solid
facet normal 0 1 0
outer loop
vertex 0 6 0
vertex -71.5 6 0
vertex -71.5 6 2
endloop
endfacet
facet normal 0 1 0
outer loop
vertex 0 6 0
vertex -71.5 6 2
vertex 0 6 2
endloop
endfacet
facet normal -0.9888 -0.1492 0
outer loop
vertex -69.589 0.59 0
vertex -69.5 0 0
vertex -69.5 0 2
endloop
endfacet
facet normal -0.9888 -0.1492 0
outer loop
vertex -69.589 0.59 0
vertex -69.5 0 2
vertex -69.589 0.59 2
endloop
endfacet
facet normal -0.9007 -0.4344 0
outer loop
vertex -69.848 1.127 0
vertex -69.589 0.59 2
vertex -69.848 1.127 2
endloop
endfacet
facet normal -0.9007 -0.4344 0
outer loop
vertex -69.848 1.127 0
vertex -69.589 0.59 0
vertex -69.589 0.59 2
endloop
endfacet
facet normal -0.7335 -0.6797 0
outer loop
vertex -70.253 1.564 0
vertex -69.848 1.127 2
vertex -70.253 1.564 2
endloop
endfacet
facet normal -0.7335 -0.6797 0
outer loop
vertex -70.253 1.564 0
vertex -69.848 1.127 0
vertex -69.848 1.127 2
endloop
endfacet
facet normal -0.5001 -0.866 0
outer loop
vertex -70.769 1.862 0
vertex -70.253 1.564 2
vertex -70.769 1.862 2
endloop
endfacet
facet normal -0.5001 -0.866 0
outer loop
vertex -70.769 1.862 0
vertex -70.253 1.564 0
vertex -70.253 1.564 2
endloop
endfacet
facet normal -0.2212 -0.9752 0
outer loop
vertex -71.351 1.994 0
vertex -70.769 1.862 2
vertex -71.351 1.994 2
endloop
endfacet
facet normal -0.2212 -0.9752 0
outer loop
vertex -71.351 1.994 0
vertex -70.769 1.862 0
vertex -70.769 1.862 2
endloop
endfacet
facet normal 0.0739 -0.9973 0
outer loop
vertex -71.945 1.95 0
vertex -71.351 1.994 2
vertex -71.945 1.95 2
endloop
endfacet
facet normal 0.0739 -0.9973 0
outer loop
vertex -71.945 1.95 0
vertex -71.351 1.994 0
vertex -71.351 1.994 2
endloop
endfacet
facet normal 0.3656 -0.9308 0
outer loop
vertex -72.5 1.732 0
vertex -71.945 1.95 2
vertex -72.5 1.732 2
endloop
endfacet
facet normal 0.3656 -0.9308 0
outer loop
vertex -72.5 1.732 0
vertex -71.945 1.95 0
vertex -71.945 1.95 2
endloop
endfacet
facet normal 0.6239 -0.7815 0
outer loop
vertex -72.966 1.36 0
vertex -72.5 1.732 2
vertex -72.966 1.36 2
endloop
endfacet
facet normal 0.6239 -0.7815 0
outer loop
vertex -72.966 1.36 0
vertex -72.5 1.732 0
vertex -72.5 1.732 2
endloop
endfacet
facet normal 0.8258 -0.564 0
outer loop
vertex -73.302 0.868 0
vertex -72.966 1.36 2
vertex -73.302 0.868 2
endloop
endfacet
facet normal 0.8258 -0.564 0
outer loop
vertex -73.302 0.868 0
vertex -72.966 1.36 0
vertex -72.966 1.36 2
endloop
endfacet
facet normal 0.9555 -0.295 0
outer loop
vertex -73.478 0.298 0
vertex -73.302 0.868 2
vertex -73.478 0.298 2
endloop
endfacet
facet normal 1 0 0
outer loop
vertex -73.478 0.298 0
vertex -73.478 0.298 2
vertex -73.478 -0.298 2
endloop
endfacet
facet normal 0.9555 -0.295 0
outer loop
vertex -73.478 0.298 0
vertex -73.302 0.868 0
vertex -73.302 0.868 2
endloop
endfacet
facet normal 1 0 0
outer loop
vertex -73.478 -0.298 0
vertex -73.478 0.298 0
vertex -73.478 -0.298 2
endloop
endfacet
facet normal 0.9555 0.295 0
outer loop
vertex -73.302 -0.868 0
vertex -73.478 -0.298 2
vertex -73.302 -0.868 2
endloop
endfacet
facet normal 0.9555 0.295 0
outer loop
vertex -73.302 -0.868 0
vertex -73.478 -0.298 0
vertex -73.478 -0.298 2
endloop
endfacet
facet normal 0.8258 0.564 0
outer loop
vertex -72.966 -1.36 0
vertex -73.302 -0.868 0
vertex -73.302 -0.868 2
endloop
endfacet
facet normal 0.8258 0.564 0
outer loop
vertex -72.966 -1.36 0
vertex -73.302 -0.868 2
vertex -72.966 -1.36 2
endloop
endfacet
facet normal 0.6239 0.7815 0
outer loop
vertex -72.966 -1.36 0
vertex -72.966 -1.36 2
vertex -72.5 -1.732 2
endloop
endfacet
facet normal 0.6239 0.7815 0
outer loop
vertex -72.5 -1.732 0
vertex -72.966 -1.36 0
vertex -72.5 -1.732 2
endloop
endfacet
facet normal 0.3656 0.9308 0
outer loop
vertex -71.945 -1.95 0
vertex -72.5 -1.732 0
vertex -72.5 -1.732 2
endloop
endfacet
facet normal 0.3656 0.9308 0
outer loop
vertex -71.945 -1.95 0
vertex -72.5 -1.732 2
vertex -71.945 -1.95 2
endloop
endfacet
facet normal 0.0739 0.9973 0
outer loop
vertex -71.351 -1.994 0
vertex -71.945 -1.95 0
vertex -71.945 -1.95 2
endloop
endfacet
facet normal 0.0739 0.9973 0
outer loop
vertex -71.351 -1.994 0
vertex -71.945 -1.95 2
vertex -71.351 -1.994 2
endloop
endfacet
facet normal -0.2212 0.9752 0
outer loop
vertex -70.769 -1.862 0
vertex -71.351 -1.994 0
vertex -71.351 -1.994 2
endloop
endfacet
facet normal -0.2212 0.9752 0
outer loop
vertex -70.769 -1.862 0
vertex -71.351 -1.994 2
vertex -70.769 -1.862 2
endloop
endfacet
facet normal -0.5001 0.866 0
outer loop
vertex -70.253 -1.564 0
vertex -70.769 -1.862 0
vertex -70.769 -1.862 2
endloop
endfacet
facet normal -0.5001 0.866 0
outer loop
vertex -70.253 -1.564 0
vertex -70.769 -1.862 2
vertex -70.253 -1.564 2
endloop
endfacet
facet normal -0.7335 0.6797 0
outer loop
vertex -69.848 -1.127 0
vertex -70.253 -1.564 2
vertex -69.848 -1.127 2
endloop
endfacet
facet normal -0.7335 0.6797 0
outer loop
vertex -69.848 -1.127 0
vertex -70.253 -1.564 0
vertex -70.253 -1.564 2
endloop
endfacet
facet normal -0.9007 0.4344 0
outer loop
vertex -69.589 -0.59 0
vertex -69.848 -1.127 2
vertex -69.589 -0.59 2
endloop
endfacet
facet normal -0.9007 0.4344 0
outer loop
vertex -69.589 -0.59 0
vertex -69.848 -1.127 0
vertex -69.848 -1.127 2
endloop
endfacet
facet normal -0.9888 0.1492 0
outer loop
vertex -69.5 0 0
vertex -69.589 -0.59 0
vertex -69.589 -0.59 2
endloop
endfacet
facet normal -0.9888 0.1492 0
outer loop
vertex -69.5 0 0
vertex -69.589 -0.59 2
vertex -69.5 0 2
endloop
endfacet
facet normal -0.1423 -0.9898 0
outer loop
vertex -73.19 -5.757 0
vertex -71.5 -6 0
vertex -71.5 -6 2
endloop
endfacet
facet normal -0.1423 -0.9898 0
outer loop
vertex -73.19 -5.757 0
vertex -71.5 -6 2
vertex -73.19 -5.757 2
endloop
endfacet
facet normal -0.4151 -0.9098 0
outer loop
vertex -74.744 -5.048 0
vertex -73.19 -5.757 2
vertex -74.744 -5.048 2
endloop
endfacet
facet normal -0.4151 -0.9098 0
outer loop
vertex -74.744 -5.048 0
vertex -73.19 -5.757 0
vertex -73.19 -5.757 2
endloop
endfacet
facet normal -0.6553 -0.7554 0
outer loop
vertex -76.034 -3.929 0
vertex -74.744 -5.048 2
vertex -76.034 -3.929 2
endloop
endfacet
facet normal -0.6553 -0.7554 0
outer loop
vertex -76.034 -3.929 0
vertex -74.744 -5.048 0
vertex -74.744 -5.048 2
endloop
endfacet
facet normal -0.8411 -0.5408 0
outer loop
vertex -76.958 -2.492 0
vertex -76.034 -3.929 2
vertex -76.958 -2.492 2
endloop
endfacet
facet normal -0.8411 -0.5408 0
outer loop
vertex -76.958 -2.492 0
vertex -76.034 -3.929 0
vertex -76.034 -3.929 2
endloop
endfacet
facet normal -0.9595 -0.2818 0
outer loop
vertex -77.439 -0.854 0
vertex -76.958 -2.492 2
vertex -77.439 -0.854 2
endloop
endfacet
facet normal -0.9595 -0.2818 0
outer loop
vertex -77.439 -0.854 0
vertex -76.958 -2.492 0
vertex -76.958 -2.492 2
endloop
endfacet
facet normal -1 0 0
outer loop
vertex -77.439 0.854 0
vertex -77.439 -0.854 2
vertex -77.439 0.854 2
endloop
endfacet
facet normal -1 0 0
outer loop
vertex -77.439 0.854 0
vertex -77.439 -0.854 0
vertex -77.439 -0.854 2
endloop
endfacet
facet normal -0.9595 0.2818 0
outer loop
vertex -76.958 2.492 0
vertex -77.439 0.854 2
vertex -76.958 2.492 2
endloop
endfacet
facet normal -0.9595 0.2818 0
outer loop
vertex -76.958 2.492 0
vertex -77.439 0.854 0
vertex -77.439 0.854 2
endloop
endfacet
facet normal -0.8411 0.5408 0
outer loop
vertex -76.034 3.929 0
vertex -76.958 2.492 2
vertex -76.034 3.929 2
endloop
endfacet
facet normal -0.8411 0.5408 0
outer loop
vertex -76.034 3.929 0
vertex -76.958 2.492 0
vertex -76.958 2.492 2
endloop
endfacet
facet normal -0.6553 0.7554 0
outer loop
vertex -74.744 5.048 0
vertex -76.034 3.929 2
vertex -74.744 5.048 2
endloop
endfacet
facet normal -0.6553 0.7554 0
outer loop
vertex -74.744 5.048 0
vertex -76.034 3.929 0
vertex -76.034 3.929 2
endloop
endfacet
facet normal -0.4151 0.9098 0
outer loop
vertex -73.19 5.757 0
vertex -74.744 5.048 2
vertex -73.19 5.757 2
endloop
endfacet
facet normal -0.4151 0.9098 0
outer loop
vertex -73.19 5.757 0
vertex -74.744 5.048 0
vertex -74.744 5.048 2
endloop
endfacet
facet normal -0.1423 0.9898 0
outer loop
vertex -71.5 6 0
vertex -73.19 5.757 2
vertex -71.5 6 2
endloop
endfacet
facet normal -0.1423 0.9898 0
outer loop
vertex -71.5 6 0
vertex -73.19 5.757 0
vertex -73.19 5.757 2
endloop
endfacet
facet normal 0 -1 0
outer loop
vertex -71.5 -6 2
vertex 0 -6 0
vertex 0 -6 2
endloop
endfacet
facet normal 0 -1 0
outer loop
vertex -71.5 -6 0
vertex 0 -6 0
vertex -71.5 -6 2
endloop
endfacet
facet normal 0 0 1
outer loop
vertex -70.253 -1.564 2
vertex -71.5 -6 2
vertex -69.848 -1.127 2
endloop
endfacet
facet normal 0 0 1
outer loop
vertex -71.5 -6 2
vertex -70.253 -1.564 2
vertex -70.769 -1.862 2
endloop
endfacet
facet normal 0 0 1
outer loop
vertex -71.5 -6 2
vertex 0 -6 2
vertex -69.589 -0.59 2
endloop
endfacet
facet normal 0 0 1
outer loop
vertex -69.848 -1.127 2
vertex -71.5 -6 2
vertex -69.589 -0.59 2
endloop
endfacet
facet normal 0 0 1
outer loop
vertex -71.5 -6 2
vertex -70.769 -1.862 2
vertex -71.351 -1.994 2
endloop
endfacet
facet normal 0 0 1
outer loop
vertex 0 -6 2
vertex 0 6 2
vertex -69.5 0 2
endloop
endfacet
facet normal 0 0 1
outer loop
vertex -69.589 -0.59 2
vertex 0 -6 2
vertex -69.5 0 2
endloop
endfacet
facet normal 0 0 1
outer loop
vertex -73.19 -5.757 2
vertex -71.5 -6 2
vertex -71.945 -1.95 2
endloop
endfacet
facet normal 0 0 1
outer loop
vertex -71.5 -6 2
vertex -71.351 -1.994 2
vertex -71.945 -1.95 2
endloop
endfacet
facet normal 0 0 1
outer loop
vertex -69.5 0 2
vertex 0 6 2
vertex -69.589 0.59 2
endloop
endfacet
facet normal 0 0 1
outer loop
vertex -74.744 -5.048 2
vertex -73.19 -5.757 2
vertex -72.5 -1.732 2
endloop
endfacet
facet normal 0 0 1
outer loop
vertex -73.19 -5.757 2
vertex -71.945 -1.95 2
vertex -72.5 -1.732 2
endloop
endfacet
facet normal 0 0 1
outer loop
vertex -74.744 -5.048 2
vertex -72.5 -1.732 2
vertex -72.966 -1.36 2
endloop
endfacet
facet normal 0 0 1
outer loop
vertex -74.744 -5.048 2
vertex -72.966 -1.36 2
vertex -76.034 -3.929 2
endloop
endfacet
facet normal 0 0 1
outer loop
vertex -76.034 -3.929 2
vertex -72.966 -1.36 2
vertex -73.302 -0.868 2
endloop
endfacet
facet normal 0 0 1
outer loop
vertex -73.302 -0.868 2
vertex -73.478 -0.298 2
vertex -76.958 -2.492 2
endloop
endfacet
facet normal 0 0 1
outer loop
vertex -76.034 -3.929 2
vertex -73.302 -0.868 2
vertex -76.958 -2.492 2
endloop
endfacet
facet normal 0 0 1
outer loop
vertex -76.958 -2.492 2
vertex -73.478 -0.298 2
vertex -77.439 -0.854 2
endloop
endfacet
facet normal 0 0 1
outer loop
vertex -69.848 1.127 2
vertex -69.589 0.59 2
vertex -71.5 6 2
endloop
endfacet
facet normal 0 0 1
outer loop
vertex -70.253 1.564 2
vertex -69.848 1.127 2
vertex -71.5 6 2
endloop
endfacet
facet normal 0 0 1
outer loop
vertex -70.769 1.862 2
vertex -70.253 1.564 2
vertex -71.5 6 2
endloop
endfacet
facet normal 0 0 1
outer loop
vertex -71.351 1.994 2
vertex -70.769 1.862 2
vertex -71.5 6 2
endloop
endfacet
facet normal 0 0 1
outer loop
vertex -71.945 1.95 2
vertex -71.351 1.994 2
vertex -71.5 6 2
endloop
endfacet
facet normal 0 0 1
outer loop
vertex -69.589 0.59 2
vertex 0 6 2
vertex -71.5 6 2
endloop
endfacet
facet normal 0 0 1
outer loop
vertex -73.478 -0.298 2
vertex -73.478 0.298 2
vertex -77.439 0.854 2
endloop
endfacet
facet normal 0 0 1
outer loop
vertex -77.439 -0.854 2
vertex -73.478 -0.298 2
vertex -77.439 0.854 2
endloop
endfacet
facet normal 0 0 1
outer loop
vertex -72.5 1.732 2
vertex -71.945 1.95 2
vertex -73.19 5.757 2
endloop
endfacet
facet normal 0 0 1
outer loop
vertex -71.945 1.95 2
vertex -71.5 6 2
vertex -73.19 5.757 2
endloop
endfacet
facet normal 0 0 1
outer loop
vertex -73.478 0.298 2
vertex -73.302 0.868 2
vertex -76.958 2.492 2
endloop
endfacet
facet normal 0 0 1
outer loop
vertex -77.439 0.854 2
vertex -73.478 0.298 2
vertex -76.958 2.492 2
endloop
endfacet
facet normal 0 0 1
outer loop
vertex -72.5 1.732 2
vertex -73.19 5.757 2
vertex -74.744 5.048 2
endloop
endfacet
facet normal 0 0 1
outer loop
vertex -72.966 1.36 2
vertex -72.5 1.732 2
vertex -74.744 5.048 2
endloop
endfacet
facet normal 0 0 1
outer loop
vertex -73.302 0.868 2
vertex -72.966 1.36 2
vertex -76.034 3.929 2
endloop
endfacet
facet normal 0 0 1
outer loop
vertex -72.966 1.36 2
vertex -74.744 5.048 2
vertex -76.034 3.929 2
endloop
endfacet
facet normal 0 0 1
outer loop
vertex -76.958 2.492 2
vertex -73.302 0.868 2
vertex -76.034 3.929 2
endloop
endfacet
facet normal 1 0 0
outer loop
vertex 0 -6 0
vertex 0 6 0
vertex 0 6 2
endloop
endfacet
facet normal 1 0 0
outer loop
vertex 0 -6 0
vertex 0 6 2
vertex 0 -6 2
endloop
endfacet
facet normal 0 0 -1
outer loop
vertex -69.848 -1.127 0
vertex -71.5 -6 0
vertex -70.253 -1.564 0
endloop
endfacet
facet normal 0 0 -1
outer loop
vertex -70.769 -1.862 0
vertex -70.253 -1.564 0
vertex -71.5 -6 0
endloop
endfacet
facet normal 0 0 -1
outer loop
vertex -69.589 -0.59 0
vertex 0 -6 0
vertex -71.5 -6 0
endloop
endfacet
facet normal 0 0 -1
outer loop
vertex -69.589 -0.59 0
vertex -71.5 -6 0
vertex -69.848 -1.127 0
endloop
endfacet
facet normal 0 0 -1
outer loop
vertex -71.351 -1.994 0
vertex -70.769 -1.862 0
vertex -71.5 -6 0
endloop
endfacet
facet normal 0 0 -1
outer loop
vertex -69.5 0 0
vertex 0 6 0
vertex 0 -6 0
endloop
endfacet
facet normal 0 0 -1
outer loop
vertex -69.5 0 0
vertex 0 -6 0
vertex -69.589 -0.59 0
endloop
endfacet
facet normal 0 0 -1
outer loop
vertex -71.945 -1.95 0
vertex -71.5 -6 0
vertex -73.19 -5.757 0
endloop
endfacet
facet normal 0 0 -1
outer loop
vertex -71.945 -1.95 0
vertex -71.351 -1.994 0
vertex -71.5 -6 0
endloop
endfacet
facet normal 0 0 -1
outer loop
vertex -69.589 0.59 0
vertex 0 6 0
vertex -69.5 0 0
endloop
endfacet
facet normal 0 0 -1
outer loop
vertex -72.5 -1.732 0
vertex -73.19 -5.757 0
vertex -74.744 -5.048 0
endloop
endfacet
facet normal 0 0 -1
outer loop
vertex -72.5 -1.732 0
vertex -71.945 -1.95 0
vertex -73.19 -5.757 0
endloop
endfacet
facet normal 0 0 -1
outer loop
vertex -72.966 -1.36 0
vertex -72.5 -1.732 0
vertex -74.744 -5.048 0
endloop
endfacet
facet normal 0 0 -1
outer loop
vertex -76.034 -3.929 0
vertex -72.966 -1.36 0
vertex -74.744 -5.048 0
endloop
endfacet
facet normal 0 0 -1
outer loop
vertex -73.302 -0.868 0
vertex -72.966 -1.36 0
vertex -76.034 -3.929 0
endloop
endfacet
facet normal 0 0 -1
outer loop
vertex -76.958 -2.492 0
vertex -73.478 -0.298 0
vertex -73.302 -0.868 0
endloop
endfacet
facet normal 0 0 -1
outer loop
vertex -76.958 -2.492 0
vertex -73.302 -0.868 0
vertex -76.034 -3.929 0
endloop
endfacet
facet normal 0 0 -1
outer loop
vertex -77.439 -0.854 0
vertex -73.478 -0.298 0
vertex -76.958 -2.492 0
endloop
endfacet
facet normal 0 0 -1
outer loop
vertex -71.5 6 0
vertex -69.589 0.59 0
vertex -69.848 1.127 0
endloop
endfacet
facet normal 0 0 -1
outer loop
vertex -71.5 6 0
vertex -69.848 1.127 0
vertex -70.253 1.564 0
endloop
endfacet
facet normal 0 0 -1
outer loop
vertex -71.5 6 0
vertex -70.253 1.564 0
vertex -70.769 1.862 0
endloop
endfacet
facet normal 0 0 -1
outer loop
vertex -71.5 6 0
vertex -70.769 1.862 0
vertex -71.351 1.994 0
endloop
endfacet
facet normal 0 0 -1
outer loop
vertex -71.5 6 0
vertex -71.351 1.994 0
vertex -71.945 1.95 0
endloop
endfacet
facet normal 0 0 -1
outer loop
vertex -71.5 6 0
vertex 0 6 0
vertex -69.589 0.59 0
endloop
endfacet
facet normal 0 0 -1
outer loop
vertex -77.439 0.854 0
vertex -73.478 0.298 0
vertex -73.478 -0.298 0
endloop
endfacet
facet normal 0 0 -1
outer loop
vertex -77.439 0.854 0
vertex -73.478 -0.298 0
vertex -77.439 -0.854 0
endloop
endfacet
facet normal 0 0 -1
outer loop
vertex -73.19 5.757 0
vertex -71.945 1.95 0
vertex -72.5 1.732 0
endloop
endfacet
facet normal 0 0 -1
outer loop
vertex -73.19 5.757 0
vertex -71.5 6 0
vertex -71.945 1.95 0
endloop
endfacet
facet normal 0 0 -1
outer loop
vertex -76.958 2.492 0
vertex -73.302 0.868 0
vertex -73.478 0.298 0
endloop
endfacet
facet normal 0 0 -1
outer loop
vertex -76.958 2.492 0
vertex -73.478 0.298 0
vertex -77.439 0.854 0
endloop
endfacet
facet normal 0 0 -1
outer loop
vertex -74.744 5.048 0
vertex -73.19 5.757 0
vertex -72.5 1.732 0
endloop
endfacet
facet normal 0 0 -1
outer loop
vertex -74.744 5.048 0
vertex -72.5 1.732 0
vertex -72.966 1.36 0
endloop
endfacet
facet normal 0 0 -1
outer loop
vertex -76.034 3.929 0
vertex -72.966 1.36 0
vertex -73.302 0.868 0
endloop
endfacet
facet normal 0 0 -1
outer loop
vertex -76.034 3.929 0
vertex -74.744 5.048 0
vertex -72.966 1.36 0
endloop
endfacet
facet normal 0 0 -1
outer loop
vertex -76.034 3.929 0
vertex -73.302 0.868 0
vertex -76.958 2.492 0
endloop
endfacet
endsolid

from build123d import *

# Parameters (mm, degrees)
ESQUISSE1_R                  = 2
BOSS_EXTRU_1_DEPTH           = 2
ENL_V_MAT_EXTRU_1_DEPTH      = 78.757636281
ENL_V_MAT_EXTRU_1_DEPTH_BACK = 78.757636281


with BuildPart() as part:
    # Esquisse1 → Boss.-Extru.1 (new body)
    with BuildSketch(Plane.XY):
        with BuildLine():
            Line((-71.5, 6), (71.5, 6))
            ThreePointArc((71.5, 6), (77.5, 0), (71.5, -6))
            Line((71.5, -6), (-71.5, -6))
            ThreePointArc((-71.5, -6), (-77.5, 0), (-71.5, 6))
        make_face()
        with Locations((-71.5, 0)):
            Circle(ESQUISSE1_R, mode=Mode.SUBTRACT)
        with Locations((71.5, 0)):
            Circle(ESQUISSE1_R, mode=Mode.SUBTRACT)
    extrude(amount=BOSS_EXTRU_1_DEPTH)

    # Esquisse3 → Enlèv. mat.-Extru.1 (cut, two sides: drawn at the far end of the back side and taken through both)
    with BuildSketch(Plane.XY.offset(2).offset(-ENL_V_MAT_EXTRU_1_DEPTH_BACK)):
        Polygon((0, 0), (0, 10.962701513), (80.234264698, 10.962701513), (80.234264698, -13.981416423), (0, -13.981416423), align=None)
    extrude(amount=ENL_V_MAT_EXTRU_1_DEPTH + ENL_V_MAT_EXTRU_1_DEPTH_BACK, mode=Mode.SUBTRACT)


solid = part.part
